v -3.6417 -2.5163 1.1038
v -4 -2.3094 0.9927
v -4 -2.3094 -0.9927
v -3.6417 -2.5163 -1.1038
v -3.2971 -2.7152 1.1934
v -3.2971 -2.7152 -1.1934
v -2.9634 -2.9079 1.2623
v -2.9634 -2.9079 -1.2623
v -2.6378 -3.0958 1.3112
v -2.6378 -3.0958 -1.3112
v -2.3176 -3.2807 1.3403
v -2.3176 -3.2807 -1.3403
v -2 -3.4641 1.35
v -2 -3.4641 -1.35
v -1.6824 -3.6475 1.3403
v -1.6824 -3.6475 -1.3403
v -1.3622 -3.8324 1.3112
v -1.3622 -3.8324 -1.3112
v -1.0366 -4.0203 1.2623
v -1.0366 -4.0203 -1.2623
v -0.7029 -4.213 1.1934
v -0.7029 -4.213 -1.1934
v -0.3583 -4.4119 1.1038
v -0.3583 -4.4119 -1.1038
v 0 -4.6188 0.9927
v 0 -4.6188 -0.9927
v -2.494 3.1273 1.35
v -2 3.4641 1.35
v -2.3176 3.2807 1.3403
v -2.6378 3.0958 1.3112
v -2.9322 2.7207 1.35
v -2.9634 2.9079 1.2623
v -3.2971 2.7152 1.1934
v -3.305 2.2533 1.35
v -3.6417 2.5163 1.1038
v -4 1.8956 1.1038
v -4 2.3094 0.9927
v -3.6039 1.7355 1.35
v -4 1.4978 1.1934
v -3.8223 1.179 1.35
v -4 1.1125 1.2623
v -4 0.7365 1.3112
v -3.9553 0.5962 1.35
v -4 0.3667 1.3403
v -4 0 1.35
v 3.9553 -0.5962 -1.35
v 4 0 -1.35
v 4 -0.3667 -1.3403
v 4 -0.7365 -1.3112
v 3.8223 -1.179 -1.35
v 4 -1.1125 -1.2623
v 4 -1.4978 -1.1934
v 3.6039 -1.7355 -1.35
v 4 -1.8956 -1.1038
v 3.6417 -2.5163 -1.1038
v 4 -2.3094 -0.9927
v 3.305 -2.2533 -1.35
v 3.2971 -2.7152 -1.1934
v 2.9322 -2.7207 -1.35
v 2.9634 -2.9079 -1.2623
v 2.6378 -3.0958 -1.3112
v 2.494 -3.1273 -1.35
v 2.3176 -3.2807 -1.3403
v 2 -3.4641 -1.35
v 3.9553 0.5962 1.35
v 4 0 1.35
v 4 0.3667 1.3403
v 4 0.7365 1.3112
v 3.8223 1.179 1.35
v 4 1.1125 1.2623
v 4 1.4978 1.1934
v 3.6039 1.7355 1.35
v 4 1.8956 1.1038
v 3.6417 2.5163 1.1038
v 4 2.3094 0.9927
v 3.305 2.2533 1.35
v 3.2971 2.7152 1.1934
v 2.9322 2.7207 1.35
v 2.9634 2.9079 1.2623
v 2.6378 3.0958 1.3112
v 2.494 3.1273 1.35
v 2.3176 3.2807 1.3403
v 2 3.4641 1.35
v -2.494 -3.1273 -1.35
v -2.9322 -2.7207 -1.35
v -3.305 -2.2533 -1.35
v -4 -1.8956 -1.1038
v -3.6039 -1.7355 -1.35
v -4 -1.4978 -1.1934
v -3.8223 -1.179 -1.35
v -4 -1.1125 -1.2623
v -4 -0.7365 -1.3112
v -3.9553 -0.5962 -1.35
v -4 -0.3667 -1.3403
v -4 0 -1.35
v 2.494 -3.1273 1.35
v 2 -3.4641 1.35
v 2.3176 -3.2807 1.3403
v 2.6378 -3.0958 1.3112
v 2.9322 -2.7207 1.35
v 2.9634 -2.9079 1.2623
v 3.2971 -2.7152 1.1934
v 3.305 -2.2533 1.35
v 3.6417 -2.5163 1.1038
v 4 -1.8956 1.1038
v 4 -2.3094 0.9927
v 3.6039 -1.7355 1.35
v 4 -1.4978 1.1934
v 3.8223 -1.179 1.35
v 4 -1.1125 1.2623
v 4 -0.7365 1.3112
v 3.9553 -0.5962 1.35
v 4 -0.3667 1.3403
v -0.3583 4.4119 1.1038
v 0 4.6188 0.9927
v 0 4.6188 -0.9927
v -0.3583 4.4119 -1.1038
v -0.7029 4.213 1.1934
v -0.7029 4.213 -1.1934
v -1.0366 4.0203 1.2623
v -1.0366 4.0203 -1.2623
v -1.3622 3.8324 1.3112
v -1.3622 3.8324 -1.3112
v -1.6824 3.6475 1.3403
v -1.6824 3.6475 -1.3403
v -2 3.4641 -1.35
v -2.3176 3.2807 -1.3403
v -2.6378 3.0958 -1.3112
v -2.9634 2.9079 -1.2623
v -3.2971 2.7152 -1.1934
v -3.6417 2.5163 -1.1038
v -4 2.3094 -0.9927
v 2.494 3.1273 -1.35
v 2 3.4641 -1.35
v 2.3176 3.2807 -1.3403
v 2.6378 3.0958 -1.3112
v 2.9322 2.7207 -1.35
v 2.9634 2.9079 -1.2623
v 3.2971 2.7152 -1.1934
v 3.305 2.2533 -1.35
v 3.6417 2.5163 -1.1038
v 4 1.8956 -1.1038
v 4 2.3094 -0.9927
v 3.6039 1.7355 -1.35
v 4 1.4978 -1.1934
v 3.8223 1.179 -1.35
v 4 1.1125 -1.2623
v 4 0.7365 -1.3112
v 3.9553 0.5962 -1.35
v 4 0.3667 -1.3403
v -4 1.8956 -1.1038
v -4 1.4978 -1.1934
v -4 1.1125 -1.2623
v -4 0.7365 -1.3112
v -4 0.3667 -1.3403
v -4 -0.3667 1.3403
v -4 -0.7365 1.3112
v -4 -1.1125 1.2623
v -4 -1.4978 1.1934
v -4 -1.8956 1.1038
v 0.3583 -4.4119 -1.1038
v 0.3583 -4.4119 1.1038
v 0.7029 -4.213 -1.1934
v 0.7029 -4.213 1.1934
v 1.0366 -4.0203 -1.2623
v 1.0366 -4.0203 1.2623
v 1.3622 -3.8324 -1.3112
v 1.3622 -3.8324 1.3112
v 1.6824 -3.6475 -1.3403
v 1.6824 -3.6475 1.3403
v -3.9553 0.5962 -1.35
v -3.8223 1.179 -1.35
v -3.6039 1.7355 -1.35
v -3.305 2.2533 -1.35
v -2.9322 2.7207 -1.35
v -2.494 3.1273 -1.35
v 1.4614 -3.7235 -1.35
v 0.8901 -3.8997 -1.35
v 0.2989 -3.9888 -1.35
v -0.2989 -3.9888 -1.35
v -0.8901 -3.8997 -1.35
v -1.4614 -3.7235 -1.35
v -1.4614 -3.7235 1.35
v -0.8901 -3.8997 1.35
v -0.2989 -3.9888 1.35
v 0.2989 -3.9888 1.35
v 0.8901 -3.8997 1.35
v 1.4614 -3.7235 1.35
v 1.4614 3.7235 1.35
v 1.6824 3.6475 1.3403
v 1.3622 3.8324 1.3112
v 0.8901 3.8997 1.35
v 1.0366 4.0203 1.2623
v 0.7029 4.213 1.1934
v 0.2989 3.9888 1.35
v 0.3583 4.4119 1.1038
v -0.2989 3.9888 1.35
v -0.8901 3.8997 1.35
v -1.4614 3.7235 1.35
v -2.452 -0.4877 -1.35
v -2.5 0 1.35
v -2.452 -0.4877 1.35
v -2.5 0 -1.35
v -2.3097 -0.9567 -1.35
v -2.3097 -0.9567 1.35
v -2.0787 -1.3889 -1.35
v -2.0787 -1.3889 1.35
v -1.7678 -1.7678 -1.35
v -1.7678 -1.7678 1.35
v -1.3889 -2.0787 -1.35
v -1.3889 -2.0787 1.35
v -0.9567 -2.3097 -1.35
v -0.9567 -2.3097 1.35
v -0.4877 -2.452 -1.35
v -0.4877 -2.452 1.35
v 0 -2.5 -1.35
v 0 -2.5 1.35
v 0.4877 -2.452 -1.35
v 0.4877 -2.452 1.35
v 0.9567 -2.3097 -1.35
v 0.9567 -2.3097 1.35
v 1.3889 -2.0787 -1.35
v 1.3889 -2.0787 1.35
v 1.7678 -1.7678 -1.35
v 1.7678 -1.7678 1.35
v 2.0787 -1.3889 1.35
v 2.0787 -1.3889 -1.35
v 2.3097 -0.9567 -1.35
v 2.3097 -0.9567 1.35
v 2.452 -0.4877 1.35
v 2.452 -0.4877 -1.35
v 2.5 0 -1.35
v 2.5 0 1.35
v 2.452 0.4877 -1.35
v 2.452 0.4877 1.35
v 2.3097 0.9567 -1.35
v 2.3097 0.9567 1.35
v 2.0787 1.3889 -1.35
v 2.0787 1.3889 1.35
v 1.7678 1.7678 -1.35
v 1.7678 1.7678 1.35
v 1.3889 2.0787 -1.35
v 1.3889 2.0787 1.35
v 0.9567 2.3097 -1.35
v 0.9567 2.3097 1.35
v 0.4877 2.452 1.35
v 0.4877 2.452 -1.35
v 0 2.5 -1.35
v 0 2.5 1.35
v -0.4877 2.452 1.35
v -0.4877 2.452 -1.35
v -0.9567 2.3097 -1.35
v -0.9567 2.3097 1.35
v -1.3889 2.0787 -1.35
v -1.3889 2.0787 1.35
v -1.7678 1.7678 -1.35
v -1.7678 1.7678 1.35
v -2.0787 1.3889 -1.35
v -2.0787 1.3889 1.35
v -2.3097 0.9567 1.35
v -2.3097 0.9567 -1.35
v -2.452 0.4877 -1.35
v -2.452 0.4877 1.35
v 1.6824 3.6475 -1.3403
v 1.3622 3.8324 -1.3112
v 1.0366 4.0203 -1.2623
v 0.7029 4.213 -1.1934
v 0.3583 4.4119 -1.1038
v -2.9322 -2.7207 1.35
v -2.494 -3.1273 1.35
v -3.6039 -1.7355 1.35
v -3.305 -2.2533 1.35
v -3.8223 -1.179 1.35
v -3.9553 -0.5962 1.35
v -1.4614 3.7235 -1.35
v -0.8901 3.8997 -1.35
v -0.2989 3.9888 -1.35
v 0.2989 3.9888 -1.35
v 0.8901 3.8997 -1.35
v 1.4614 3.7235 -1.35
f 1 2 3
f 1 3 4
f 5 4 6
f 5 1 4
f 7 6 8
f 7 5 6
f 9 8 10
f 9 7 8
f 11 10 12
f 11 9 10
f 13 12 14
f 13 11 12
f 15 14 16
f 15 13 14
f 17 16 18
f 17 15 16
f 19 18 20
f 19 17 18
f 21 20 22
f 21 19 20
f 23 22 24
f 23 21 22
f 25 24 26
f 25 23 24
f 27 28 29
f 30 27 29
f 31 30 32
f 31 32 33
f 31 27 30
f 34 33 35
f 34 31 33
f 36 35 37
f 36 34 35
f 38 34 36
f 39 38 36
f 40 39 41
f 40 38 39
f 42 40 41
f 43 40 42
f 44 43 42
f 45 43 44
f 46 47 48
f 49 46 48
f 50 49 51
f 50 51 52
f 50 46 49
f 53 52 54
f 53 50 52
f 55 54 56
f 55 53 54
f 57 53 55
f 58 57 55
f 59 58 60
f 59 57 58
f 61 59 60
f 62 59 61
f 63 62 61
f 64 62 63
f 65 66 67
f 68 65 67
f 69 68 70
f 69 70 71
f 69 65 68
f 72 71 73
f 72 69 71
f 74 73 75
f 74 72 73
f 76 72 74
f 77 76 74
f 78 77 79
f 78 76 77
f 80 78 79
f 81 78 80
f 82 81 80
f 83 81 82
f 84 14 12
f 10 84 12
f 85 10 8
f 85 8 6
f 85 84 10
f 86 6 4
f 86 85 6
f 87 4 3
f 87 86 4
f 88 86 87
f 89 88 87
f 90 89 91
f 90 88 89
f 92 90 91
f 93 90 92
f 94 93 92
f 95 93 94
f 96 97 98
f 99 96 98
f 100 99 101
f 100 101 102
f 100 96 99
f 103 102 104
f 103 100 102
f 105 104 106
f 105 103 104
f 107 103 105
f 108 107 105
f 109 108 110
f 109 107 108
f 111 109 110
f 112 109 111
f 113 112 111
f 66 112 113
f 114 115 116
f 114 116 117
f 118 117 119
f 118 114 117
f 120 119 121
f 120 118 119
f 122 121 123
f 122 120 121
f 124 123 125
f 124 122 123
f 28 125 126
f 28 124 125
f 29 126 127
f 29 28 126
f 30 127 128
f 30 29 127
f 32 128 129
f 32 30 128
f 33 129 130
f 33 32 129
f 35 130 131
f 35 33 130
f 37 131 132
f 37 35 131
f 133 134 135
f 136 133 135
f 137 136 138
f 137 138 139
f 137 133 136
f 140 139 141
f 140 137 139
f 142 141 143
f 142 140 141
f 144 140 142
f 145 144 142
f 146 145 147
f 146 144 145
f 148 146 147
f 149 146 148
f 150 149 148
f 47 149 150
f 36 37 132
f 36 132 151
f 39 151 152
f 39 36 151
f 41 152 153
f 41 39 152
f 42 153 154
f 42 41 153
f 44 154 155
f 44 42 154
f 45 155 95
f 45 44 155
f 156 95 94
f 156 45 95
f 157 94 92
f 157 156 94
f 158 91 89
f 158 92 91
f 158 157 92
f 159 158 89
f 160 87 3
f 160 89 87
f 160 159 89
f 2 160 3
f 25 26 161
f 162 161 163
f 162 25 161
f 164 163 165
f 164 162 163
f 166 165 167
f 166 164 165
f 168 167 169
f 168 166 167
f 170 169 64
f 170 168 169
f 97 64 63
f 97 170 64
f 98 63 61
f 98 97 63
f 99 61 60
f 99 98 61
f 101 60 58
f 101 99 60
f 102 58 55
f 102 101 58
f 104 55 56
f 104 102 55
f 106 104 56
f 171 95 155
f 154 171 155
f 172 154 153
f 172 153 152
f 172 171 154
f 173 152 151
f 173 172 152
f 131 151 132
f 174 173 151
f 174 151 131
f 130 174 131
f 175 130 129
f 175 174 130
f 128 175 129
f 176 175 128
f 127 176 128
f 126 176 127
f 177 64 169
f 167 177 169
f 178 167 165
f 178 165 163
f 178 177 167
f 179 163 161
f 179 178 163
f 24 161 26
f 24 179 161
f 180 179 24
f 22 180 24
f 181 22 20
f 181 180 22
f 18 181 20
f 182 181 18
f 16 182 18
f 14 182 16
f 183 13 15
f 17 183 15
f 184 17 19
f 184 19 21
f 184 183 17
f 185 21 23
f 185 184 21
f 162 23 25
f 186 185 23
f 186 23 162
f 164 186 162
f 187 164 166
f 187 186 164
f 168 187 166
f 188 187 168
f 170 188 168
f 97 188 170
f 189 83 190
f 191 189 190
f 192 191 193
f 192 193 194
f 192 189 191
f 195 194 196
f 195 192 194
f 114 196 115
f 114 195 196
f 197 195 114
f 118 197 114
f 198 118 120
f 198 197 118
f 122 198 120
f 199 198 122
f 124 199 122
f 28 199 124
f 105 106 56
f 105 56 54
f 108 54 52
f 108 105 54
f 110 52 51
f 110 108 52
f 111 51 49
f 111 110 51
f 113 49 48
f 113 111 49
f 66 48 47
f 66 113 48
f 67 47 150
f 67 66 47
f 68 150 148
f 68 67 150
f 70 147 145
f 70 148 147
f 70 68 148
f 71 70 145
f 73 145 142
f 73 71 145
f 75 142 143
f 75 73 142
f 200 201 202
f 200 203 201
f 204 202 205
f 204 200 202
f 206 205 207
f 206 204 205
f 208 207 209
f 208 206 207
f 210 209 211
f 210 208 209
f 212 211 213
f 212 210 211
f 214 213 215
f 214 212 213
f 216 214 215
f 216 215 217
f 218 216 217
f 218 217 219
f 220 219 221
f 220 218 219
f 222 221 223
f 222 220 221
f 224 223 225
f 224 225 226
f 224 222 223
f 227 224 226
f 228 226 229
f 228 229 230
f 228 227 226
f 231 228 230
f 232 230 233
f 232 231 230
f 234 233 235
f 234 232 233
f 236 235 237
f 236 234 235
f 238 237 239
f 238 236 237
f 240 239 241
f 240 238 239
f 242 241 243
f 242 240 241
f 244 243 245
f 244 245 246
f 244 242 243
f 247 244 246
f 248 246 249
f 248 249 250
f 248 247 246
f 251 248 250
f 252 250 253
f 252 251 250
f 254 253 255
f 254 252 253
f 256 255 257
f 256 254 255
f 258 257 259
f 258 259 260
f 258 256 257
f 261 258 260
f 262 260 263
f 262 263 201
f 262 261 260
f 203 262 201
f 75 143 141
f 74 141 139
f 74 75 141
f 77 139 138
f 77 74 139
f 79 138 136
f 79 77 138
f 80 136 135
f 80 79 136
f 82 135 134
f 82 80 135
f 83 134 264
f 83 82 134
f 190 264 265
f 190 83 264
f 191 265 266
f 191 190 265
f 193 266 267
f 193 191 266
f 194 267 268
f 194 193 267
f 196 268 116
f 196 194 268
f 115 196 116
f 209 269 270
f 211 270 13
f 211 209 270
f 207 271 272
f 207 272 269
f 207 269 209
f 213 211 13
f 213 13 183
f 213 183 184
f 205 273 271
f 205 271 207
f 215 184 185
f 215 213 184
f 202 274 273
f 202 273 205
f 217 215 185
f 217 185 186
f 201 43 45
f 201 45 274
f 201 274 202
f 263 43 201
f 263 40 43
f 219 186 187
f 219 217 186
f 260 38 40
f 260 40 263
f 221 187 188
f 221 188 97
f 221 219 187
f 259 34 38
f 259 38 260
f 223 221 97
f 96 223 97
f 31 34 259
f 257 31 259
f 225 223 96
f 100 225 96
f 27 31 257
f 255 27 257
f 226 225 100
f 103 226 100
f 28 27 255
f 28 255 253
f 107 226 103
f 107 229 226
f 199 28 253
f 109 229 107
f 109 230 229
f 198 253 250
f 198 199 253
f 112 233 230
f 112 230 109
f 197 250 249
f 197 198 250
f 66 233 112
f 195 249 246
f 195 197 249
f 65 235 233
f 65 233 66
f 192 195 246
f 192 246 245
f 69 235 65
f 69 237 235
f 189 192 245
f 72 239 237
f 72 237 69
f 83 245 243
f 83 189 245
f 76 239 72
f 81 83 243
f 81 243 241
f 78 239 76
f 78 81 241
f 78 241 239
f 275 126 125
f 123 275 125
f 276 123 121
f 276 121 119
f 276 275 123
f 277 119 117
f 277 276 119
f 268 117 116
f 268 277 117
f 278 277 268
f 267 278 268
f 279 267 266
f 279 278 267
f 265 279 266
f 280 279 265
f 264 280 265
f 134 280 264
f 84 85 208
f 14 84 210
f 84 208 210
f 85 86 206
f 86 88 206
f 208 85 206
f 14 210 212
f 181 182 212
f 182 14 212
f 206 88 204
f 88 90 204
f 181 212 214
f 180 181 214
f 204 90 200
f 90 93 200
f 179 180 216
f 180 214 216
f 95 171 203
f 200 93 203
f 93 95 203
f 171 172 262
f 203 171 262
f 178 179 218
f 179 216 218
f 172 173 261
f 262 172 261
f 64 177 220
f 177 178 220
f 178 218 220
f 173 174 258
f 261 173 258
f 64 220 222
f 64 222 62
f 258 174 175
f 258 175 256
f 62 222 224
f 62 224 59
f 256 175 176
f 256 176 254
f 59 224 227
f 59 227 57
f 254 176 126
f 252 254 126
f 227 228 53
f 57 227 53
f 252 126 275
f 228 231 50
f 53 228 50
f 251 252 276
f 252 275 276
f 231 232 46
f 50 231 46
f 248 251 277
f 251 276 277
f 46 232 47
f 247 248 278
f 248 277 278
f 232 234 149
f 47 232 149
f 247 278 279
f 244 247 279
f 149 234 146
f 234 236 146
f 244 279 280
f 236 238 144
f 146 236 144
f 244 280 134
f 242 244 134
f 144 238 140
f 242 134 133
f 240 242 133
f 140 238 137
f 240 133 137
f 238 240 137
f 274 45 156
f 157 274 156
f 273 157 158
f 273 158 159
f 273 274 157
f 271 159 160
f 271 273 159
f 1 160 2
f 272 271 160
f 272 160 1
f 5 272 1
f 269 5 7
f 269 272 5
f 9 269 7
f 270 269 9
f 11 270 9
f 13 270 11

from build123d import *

# Parameters (mm, degrees)
SZKIC1_R                    = 2.5
DODANIE_WYCI_GNI_CIE1_DEPTH = 1.35
SZKIC2_OUTSIDE_W            = 21.856
SZKIC2_OUTSIDE_H            = 23.094
SZKIC2_OUTSIDE_R            = 4
WYTNIJ_WYCI_GNI_CIE2_DEPTH  = 2.7
WYTNIJ_WYCI_GNI_CIE2_DRAFT  = -60
LUSTRO1_COPY_1_SKETCH_W     = 21.856
LUSTRO1_COPY_1_SKETCH_H     = 23.094
LUSTRO1_COPY_1_SKETCH_R     = 4
LUSTRO1_COPY_1_DEPTH        = 2.7
LUSTRO1_COPY_1_DRAFT        = -60


with BuildPart() as part:
    # Szkic1 → Dodanie-wyciągnięcie1 (new, symmetric)
    with BuildSketch(Plane.XY):
        Polygon((-4, 2.309401077), (-4, -2.309401077), (0, -4.618802154), (4, -2.309401077), (4, 2.309401077), (0, 4.618802154), align=None)
        with Locations(Location((0, 0, 0), (0, 0, 180))):
            Circle(SZKIC1_R, mode=Mode.SUBTRACT)
    extrude(amount=DODANIE_WYCI_GNI_CIE1_DEPTH, both=True)


with BuildPart() as wytnij_wyci_gni_cie2_tool:
    # Szkic2 outside → Wytnij-wyciągnięcie2 (with draft: the straight prism first)
    with BuildSketch(Plane.XY.offset(1.35)):
        Rectangle(SZKIC2_OUTSIDE_W, SZKIC2_OUTSIDE_H)
        Circle(SZKIC2_OUTSIDE_R, mode=Mode.SUBTRACT)
    extrude(amount=-WYTNIJ_WYCI_GNI_CIE2_DEPTH)
    # Wytnij-wyciągnięcie2: the draft: its side faces are tilted about the plane it starts from
    wytnij_wyci_gni_cie2_sides = [wytnij_wyci_gni_cie2_tool.faces().sort_by_distance(p)[0] for p in [
        (0, -11.547, 0),
        (10.928, 0, 0),
        (0, 11.547, 0),
        (-10.928, 0, 0),
        (-4, 0, 0),
    ]]
    draft(wytnij_wyci_gni_cie2_sides, Plane.XY.offset(1.35), WYTNIJ_WYCI_GNI_CIE2_DRAFT)


with BuildPart() as part_1:
    add(part.part)

    # Wytnij-wyciągnięcie2: cut by wytnij_wyci_gni_cie2_tool
    add(wytnij_wyci_gni_cie2_tool.part, mode=Mode.SUBTRACT)


with BuildPart() as lustro1_copy_1_tool:
    # Lustro1 copy 1 sketch → Lustro1 copy 1 (with draft: the straight prism first)
    with BuildSketch(Plane(origin=(0, 0, -1.35), x_dir=(1, 0, 0), z_dir=(0, 0, -1))):
        Rectangle(LUSTRO1_COPY_1_SKETCH_W, LUSTRO1_COPY_1_SKETCH_H)
        Circle(LUSTRO1_COPY_1_SKETCH_R, mode=Mode.SUBTRACT)
    extrude(amount=-LUSTRO1_COPY_1_DEPTH)
    # Lustro1 copy 1: the draft: its side faces are tilted about the plane it starts from
    lustro1_copy_1_sides = [lustro1_copy_1_tool.faces().sort_by_distance(p)[0] for p in [
        (0, -11.547, 0),
        (10.928, 0, 0),
        (0, 11.547, 0),
        (-10.928, 0, 0),
        (-4, 0, 0),
    ]]
    draft(lustro1_copy_1_sides, Plane(origin=(0, 0, -1.35), x_dir=(1, 0, 0), z_dir=(0, 0, -1)), LUSTRO1_COPY_1_DRAFT)


with BuildPart() as part_2:
    add(part_1.part)

    # Lustro1 copy 1: cut by lustro1_copy_1_tool
    add(lustro1_copy_1_tool.part, mode=Mode.SUBTRACT)


solid = part_2.part
